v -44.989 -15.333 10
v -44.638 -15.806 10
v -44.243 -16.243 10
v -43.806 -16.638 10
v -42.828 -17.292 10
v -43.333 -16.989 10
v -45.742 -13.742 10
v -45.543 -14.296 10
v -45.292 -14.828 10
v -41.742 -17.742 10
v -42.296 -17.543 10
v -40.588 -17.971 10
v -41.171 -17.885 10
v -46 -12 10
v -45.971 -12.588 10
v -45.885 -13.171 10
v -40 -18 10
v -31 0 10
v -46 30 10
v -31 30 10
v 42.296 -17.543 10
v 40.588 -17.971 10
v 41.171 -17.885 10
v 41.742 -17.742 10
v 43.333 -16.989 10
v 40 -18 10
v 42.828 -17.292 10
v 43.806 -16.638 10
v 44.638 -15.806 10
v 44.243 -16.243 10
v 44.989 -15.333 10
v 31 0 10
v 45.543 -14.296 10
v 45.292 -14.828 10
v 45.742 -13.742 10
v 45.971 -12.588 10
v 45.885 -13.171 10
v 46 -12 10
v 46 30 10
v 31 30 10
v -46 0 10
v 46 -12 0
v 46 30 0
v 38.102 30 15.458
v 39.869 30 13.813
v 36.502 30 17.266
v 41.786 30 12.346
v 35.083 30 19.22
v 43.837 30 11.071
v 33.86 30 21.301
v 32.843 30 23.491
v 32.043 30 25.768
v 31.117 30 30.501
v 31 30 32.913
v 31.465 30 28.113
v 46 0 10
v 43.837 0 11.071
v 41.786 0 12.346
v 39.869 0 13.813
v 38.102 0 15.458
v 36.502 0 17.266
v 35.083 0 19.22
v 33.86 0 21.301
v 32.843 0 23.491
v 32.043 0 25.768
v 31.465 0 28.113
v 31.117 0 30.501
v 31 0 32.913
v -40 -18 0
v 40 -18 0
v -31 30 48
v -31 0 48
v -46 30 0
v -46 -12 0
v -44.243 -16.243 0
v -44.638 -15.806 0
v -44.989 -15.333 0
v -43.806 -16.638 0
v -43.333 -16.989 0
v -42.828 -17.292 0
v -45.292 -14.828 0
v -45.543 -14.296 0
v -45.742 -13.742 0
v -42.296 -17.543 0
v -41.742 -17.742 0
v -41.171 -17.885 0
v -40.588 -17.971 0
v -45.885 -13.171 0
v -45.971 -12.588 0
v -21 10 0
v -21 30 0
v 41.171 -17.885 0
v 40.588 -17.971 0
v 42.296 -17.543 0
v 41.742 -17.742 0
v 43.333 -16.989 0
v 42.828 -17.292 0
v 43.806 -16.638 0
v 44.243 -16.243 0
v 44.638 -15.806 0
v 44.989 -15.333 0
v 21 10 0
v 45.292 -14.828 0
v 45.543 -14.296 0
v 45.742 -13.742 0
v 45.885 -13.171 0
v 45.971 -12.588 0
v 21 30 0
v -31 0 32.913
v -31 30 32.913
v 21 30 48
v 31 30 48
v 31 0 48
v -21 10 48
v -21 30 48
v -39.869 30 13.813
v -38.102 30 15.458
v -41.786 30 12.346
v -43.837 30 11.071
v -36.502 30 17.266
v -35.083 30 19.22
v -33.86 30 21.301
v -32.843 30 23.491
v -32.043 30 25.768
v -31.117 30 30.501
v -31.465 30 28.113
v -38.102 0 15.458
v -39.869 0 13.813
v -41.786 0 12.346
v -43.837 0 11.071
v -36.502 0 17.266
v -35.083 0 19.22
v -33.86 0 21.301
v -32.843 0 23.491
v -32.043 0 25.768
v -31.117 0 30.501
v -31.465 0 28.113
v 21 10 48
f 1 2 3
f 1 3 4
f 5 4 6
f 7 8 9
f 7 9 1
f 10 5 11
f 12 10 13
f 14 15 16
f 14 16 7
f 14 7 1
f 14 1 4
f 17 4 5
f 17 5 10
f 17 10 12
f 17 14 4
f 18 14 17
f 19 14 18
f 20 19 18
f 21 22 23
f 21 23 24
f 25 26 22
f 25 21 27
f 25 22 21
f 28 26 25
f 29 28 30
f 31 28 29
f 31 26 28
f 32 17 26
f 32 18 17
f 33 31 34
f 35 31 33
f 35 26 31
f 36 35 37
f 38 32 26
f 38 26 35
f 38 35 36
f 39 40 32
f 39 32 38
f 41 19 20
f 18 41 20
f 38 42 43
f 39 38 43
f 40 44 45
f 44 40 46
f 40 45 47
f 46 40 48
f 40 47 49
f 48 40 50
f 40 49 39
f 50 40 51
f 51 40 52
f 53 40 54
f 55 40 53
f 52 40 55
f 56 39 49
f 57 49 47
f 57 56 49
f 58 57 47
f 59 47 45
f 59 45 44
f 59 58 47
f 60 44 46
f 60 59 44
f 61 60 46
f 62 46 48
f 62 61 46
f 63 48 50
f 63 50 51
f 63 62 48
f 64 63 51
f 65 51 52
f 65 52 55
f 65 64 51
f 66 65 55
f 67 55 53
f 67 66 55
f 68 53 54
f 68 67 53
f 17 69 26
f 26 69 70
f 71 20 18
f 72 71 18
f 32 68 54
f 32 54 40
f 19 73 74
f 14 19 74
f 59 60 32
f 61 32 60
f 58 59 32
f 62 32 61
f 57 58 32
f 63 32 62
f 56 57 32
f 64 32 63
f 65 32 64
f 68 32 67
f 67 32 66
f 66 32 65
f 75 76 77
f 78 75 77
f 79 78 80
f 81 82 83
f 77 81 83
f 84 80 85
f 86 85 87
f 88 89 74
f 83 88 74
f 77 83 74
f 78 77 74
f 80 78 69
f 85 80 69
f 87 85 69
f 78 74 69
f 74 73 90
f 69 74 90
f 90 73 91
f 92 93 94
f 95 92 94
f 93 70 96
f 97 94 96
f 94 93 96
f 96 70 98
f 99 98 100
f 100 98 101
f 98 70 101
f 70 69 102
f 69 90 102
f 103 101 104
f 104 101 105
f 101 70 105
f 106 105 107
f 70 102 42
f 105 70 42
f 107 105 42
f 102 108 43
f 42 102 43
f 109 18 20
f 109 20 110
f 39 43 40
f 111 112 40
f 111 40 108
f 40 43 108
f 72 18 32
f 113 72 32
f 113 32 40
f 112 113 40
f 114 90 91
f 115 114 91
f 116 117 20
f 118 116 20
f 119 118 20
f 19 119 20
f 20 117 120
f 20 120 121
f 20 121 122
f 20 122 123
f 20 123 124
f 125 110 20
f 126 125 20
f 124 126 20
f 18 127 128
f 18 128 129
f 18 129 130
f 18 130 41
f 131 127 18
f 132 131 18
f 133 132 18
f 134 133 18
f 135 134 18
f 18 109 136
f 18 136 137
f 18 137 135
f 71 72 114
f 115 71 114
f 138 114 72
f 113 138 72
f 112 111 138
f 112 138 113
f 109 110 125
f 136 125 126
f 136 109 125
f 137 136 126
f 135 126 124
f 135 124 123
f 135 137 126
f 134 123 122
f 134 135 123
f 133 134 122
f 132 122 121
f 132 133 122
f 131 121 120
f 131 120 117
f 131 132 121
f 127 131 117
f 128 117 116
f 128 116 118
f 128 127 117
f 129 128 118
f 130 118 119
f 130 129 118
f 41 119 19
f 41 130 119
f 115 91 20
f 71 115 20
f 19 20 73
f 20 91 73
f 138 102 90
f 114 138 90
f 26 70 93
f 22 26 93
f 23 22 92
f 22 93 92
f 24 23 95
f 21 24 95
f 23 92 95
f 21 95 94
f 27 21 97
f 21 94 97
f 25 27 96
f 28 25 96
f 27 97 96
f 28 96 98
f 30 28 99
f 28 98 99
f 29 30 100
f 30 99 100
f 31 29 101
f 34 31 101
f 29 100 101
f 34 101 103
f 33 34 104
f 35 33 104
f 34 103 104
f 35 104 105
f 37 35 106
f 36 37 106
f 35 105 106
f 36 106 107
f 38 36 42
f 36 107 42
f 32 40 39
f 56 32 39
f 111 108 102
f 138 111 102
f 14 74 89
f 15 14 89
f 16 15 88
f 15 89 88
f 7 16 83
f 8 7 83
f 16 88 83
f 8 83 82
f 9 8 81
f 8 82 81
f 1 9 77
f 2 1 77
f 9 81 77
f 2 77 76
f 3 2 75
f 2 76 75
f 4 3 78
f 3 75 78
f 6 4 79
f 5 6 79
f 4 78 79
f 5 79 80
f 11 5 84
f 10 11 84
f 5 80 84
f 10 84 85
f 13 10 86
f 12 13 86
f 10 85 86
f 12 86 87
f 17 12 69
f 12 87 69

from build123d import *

# Parameters (mm, degrees)
F2_DEPTH = 48
F3_DEPTH = 10
F5_DEPTH = 30


with BuildPart() as f2:
    # F1 (on Top) → F2 (new body)
    with BuildSketch(Plane.XY):
        Polygon((-21, 30), (-31, 30), (-31, 0), (31, 0), (31, 30), (21, 30), (21, 10), (-21, 10), align=None)
    extrude(amount=F2_DEPTH)

    # F0 (on Top) → F3 (join)
    with BuildSketch(Plane.XY):
        with BuildLine():
            Line((46, -12), (46, 30))
            Line((46, 30), (31, 30))
            Line((31, 30), (31, 0))
            Line((31, 0), (-31, 0))
            Line((-31, 0), (-31, 30))
            Line((-31, 30), (-46, 30))
            Line((-46, 30), (-46, -12))
            ThreePointArc((-46, -12), (-44.242641, -16.242641), (-40, -18))
            Line((-40, -18), (40, -18))
            ThreePointArc((40, -18), (44.242641, -16.242641), (46, -12))
        make_face()
    extrude(amount=F3_DEPTH)


with BuildPart() as f5:
    # F4 (on Front) → F5 (new body)
    with BuildSketch(Plane.XZ):
        with BuildLine():
            ThreePointArc((-31, 32.912878), (-35.083499, 19.219815), (-46, 10))
            Line((-46, 10), (-31, 10))
            Line((-31, 10), (-31, 32.912878))
        make_face()
        with BuildLine():
            ThreePointArc((46, 10), (35.083499, 19.219815), (31, 32.912878))
            Line((31, 32.912878), (31, 10))
            Line((31, 10), (46, 10))
        make_face()
    extrude(amount=-F5_DEPTH)


solid = Compound([f2.part, f5.part])
